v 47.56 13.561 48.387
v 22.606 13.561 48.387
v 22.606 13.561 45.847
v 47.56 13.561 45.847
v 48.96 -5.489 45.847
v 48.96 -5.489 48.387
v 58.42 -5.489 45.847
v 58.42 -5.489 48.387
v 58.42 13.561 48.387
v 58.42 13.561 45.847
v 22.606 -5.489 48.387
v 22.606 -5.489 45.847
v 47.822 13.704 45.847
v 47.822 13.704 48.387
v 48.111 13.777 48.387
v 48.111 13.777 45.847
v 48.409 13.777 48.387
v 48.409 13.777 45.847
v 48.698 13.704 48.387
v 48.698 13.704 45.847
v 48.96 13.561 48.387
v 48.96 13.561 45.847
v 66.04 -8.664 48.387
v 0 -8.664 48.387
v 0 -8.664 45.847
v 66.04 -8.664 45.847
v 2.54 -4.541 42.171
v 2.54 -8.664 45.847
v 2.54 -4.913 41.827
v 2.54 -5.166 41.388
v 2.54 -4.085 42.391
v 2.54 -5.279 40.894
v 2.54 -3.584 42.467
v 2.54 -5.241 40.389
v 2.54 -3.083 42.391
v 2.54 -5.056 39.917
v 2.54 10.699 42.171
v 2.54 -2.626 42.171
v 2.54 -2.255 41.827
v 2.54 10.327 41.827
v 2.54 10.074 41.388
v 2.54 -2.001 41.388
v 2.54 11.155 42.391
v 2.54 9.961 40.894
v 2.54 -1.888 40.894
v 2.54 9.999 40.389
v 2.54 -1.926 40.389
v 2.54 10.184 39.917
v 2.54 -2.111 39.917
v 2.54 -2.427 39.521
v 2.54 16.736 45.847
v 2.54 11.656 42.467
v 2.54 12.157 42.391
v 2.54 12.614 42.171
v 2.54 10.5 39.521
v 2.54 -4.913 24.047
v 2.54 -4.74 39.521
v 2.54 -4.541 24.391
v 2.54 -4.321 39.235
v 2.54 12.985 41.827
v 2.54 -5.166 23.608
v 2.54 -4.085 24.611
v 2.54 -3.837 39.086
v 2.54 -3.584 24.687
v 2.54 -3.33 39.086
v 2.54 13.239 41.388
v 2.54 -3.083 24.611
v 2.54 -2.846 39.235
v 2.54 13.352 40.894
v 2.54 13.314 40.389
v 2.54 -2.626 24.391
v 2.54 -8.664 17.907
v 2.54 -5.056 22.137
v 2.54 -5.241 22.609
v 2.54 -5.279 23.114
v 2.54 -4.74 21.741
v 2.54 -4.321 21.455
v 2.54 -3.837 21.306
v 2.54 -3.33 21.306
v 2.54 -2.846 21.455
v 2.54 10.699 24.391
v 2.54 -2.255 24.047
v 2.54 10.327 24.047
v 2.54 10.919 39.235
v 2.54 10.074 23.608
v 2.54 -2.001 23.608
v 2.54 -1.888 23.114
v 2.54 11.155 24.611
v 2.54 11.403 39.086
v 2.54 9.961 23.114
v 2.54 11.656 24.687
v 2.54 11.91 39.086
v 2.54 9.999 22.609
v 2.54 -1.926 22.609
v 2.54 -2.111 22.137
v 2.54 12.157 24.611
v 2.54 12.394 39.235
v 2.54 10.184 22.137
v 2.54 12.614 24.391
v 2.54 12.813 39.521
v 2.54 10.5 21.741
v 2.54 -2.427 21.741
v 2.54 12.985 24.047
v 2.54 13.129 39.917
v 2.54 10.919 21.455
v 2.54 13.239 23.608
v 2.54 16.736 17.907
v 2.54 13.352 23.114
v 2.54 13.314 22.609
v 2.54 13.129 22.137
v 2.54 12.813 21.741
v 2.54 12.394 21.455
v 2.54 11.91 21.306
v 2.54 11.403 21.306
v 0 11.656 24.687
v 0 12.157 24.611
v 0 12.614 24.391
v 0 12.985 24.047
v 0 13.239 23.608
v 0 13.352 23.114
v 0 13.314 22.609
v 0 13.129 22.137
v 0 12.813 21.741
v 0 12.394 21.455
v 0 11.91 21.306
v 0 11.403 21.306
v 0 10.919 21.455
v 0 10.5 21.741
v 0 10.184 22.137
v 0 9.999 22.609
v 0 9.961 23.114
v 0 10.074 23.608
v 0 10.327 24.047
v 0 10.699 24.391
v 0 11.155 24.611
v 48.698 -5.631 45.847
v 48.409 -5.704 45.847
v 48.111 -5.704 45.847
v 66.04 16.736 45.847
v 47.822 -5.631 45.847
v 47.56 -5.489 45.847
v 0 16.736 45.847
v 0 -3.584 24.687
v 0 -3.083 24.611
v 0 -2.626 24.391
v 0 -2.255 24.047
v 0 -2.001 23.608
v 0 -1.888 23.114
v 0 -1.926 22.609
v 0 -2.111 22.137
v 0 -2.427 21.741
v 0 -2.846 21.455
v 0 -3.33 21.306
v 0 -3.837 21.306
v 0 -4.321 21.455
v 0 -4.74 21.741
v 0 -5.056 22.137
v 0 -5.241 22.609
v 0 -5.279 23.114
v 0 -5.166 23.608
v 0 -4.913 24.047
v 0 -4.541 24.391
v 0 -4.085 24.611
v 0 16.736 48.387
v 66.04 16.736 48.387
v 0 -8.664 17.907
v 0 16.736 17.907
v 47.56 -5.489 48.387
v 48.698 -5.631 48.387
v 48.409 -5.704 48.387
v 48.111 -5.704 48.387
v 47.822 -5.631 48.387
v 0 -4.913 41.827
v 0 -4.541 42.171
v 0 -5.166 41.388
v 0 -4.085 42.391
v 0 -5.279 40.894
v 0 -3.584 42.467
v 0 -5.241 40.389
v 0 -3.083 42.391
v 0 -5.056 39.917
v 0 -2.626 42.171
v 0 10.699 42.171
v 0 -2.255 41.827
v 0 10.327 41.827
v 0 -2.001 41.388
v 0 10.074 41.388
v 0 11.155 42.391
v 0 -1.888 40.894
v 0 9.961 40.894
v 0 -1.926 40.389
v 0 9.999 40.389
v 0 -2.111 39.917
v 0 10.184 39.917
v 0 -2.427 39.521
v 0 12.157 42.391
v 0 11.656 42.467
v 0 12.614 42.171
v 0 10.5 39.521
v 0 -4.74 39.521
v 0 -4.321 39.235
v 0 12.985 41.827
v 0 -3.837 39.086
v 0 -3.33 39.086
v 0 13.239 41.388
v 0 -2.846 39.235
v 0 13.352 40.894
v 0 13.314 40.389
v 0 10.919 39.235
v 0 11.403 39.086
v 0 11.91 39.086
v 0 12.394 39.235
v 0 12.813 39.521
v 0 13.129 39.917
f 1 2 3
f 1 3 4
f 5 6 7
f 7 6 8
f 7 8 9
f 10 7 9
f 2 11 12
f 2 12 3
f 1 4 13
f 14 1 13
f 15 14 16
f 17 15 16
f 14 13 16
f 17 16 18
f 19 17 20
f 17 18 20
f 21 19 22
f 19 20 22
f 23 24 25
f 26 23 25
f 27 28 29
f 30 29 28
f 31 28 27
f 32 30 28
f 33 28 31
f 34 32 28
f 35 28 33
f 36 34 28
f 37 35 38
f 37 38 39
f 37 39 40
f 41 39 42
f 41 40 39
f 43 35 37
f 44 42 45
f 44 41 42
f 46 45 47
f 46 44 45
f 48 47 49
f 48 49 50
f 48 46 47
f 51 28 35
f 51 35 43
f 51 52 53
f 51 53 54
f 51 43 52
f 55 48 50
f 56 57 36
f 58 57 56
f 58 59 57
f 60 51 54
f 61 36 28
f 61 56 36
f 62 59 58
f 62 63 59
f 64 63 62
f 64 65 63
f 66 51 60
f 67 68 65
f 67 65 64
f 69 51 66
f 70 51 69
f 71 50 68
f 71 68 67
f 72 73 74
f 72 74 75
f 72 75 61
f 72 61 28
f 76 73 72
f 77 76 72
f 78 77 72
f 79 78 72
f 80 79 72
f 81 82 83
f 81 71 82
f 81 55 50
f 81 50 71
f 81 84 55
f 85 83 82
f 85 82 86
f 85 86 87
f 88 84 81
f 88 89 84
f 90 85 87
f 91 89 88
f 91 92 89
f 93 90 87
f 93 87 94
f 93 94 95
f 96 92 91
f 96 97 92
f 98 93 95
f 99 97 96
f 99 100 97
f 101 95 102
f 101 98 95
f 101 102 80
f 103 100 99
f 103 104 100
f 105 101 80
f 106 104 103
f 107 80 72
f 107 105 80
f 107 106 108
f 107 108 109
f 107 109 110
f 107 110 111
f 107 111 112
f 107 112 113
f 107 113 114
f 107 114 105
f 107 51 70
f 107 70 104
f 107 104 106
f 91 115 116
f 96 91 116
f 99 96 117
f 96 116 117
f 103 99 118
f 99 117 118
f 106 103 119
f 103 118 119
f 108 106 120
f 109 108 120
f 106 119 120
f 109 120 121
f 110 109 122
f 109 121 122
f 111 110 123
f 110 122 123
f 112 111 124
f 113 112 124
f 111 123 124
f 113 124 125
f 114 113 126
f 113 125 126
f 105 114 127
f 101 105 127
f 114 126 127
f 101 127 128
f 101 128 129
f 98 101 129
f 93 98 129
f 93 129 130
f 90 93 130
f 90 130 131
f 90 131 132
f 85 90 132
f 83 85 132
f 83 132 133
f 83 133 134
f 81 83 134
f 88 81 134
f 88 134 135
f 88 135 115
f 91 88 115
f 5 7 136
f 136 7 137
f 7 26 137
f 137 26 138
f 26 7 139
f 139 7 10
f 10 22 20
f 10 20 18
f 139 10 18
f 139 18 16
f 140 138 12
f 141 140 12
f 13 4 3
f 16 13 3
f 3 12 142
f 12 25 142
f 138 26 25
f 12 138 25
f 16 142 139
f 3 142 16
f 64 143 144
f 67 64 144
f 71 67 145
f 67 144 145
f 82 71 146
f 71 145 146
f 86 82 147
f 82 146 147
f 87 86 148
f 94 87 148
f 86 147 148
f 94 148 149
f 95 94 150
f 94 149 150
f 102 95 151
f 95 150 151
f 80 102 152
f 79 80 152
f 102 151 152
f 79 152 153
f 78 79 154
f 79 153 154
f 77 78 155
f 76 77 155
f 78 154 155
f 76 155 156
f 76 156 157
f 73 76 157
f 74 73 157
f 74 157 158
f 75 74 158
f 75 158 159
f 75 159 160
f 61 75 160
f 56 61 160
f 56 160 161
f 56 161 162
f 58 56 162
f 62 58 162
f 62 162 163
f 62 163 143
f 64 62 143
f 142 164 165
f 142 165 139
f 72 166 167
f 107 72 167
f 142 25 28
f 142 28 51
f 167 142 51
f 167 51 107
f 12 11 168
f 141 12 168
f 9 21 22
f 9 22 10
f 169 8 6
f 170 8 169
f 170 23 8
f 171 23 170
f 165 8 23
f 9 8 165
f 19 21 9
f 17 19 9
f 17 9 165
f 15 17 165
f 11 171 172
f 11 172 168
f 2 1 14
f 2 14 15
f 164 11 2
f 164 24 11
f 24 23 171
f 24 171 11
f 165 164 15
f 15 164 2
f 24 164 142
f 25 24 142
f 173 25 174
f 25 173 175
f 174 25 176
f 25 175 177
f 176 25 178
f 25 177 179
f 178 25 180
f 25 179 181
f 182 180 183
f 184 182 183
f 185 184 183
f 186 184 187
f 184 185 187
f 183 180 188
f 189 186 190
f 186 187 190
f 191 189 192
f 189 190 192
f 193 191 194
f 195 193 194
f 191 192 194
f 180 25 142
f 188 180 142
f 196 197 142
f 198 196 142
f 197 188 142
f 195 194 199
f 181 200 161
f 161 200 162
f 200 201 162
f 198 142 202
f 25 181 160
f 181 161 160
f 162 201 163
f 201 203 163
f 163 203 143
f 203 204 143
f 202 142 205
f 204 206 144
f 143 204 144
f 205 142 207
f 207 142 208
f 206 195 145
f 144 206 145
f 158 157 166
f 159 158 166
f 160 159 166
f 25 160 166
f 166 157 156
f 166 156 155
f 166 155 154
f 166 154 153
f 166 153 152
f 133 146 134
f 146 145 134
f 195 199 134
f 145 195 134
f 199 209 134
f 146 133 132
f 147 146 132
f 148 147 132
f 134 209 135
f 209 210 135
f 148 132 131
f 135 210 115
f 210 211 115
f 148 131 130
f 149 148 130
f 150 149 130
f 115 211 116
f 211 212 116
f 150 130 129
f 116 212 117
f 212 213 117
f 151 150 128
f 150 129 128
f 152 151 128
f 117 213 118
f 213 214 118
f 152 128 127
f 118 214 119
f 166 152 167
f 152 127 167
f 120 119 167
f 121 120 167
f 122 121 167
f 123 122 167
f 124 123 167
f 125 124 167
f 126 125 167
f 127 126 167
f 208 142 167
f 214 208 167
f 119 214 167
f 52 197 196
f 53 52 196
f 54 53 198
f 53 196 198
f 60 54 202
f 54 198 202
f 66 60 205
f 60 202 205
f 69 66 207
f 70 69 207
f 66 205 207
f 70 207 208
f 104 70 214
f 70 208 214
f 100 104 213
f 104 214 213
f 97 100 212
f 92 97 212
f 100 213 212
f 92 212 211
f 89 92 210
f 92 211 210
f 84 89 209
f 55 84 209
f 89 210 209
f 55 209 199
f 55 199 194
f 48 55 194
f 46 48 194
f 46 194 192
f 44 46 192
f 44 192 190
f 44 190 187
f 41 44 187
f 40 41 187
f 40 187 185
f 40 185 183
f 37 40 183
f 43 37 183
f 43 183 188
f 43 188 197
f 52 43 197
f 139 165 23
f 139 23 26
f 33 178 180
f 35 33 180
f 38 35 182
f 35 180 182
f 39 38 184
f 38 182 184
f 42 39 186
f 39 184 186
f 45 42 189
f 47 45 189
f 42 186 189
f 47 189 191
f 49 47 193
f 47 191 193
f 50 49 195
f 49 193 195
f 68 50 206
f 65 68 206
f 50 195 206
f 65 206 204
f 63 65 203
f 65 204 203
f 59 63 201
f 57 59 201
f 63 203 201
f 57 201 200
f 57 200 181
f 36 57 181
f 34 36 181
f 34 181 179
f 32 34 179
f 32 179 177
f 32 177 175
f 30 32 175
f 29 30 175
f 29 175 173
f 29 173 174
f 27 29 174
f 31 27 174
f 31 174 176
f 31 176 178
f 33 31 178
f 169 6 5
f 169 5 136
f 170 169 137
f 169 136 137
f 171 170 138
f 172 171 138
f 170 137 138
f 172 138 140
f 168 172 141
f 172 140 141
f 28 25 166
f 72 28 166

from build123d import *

# Parameters (mm, degrees)
SKETCH1_W                           = 27.94
SKETCH1_H                           = 25.4
SIDE_CONNECTING_TO_GRIP_DEPTH       = 2.54
M3_CLEARANCE_HOLE1_D                = 3.4
SIDE_CONNECTING_TO_SERVO_DEPTH      = 63.5
SIDE_CONNECTING_TO_SERVO_DEPTH_BACK = 2.54
SKETCH6_W                           = 2.54
SKETCH6_H                           = 25.4
SKETCH9_W                           = 1.2
SKETCH9_H                           = 30.48
CUTOUT_SERVO_HOLES_AT_2_COUNT       = 2
CUTOUT_SERVO_HOLES_AT_2_PITCH       = 17.1
SKETCH10_W                          = 35.814
SKETCH10_H                          = 19.05
CUT_EXTRUDE1_DEPTH                  = 2.54


with BuildPart() as part:
    # Sketch1 → side connecting to grip (new body)
    with BuildSketch(Plane(origin=(0, 0, 0), x_dir=(0, 0, -1), z_dir=(1, 0, 0))):
        with Locations((-31.87684378, 4.036305379)):
            Rectangle(SKETCH1_W, SKETCH1_H)
    extrude(amount=SIDE_CONNECTING_TO_GRIP_DEPTH)

    # M3 Clearance Hole1 (through all)
    with Locations(Plane(origin=(2.54, 0, 0), x_dir=(0, 0, -1), z_dir=(1, 0, 0))):
        with Locations((-40.76684378, 11.656305379), (-22.98684378, 11.656305379), (-22.98684378, -3.583694621), (-40.76684378, -3.583694621)):
            Hole(M3_CLEARANCE_HOLE1_D / 2)


with BuildPart() as body_2:
    # Sketch6 → side connecting to servo (new, two sides: drawn at the far end of the back side and taken through both)
    with BuildSketch(Plane(origin=(2.54, 0, 0), x_dir=(0, 0, -1), z_dir=(1, 0, 0)).offset(-SIDE_CONNECTING_TO_SERVO_DEPTH_BACK)):
        with Locations((-47.11684378, 4.036305379)):
            Rectangle(SKETCH6_W, SKETCH6_H)
    extrude(amount=SIDE_CONNECTING_TO_SERVO_DEPTH + SIDE_CONNECTING_TO_SERVO_DEPTH_BACK)

    # Sketch9 → cutout servo holes (revolve, cut)
    with BuildSketch(Plane(origin=(48.26, 12.586305379, 48.38684378), x_dir=(0, -1, 0), z_dir=(1, 0, 0))):
        with Locations((0.6, 15.24)):
            Rectangle(SKETCH9_W, SKETCH9_H)
    cutout_servo_holes = revolve(axis=Axis((48.26, 12.586305379, 54.73684378), (0, 0, -1)), mode=Mode.SUBTRACT)

    # cutout servo holes at 2: cutout servo holes ×2
    with Locations(*[(0, -i * CUTOUT_SERVO_HOLES_AT_2_PITCH, 0) for i in range(1, CUTOUT_SERVO_HOLES_AT_2_COUNT)]):
        add(cutout_servo_holes, mode=Mode.SUBTRACT)

    # Sketch10 → Cut-Extrude1 (cut)
    with BuildSketch(Plane.XY.offset(48.38684378)):
        with Locations((40.513, 4.036305379)):
            Rectangle(SKETCH10_W, SKETCH10_H)
    extrude(amount=-CUT_EXTRUDE1_DEPTH, mode=Mode.SUBTRACT)


solid = Compound([part.part, body_2.part])
